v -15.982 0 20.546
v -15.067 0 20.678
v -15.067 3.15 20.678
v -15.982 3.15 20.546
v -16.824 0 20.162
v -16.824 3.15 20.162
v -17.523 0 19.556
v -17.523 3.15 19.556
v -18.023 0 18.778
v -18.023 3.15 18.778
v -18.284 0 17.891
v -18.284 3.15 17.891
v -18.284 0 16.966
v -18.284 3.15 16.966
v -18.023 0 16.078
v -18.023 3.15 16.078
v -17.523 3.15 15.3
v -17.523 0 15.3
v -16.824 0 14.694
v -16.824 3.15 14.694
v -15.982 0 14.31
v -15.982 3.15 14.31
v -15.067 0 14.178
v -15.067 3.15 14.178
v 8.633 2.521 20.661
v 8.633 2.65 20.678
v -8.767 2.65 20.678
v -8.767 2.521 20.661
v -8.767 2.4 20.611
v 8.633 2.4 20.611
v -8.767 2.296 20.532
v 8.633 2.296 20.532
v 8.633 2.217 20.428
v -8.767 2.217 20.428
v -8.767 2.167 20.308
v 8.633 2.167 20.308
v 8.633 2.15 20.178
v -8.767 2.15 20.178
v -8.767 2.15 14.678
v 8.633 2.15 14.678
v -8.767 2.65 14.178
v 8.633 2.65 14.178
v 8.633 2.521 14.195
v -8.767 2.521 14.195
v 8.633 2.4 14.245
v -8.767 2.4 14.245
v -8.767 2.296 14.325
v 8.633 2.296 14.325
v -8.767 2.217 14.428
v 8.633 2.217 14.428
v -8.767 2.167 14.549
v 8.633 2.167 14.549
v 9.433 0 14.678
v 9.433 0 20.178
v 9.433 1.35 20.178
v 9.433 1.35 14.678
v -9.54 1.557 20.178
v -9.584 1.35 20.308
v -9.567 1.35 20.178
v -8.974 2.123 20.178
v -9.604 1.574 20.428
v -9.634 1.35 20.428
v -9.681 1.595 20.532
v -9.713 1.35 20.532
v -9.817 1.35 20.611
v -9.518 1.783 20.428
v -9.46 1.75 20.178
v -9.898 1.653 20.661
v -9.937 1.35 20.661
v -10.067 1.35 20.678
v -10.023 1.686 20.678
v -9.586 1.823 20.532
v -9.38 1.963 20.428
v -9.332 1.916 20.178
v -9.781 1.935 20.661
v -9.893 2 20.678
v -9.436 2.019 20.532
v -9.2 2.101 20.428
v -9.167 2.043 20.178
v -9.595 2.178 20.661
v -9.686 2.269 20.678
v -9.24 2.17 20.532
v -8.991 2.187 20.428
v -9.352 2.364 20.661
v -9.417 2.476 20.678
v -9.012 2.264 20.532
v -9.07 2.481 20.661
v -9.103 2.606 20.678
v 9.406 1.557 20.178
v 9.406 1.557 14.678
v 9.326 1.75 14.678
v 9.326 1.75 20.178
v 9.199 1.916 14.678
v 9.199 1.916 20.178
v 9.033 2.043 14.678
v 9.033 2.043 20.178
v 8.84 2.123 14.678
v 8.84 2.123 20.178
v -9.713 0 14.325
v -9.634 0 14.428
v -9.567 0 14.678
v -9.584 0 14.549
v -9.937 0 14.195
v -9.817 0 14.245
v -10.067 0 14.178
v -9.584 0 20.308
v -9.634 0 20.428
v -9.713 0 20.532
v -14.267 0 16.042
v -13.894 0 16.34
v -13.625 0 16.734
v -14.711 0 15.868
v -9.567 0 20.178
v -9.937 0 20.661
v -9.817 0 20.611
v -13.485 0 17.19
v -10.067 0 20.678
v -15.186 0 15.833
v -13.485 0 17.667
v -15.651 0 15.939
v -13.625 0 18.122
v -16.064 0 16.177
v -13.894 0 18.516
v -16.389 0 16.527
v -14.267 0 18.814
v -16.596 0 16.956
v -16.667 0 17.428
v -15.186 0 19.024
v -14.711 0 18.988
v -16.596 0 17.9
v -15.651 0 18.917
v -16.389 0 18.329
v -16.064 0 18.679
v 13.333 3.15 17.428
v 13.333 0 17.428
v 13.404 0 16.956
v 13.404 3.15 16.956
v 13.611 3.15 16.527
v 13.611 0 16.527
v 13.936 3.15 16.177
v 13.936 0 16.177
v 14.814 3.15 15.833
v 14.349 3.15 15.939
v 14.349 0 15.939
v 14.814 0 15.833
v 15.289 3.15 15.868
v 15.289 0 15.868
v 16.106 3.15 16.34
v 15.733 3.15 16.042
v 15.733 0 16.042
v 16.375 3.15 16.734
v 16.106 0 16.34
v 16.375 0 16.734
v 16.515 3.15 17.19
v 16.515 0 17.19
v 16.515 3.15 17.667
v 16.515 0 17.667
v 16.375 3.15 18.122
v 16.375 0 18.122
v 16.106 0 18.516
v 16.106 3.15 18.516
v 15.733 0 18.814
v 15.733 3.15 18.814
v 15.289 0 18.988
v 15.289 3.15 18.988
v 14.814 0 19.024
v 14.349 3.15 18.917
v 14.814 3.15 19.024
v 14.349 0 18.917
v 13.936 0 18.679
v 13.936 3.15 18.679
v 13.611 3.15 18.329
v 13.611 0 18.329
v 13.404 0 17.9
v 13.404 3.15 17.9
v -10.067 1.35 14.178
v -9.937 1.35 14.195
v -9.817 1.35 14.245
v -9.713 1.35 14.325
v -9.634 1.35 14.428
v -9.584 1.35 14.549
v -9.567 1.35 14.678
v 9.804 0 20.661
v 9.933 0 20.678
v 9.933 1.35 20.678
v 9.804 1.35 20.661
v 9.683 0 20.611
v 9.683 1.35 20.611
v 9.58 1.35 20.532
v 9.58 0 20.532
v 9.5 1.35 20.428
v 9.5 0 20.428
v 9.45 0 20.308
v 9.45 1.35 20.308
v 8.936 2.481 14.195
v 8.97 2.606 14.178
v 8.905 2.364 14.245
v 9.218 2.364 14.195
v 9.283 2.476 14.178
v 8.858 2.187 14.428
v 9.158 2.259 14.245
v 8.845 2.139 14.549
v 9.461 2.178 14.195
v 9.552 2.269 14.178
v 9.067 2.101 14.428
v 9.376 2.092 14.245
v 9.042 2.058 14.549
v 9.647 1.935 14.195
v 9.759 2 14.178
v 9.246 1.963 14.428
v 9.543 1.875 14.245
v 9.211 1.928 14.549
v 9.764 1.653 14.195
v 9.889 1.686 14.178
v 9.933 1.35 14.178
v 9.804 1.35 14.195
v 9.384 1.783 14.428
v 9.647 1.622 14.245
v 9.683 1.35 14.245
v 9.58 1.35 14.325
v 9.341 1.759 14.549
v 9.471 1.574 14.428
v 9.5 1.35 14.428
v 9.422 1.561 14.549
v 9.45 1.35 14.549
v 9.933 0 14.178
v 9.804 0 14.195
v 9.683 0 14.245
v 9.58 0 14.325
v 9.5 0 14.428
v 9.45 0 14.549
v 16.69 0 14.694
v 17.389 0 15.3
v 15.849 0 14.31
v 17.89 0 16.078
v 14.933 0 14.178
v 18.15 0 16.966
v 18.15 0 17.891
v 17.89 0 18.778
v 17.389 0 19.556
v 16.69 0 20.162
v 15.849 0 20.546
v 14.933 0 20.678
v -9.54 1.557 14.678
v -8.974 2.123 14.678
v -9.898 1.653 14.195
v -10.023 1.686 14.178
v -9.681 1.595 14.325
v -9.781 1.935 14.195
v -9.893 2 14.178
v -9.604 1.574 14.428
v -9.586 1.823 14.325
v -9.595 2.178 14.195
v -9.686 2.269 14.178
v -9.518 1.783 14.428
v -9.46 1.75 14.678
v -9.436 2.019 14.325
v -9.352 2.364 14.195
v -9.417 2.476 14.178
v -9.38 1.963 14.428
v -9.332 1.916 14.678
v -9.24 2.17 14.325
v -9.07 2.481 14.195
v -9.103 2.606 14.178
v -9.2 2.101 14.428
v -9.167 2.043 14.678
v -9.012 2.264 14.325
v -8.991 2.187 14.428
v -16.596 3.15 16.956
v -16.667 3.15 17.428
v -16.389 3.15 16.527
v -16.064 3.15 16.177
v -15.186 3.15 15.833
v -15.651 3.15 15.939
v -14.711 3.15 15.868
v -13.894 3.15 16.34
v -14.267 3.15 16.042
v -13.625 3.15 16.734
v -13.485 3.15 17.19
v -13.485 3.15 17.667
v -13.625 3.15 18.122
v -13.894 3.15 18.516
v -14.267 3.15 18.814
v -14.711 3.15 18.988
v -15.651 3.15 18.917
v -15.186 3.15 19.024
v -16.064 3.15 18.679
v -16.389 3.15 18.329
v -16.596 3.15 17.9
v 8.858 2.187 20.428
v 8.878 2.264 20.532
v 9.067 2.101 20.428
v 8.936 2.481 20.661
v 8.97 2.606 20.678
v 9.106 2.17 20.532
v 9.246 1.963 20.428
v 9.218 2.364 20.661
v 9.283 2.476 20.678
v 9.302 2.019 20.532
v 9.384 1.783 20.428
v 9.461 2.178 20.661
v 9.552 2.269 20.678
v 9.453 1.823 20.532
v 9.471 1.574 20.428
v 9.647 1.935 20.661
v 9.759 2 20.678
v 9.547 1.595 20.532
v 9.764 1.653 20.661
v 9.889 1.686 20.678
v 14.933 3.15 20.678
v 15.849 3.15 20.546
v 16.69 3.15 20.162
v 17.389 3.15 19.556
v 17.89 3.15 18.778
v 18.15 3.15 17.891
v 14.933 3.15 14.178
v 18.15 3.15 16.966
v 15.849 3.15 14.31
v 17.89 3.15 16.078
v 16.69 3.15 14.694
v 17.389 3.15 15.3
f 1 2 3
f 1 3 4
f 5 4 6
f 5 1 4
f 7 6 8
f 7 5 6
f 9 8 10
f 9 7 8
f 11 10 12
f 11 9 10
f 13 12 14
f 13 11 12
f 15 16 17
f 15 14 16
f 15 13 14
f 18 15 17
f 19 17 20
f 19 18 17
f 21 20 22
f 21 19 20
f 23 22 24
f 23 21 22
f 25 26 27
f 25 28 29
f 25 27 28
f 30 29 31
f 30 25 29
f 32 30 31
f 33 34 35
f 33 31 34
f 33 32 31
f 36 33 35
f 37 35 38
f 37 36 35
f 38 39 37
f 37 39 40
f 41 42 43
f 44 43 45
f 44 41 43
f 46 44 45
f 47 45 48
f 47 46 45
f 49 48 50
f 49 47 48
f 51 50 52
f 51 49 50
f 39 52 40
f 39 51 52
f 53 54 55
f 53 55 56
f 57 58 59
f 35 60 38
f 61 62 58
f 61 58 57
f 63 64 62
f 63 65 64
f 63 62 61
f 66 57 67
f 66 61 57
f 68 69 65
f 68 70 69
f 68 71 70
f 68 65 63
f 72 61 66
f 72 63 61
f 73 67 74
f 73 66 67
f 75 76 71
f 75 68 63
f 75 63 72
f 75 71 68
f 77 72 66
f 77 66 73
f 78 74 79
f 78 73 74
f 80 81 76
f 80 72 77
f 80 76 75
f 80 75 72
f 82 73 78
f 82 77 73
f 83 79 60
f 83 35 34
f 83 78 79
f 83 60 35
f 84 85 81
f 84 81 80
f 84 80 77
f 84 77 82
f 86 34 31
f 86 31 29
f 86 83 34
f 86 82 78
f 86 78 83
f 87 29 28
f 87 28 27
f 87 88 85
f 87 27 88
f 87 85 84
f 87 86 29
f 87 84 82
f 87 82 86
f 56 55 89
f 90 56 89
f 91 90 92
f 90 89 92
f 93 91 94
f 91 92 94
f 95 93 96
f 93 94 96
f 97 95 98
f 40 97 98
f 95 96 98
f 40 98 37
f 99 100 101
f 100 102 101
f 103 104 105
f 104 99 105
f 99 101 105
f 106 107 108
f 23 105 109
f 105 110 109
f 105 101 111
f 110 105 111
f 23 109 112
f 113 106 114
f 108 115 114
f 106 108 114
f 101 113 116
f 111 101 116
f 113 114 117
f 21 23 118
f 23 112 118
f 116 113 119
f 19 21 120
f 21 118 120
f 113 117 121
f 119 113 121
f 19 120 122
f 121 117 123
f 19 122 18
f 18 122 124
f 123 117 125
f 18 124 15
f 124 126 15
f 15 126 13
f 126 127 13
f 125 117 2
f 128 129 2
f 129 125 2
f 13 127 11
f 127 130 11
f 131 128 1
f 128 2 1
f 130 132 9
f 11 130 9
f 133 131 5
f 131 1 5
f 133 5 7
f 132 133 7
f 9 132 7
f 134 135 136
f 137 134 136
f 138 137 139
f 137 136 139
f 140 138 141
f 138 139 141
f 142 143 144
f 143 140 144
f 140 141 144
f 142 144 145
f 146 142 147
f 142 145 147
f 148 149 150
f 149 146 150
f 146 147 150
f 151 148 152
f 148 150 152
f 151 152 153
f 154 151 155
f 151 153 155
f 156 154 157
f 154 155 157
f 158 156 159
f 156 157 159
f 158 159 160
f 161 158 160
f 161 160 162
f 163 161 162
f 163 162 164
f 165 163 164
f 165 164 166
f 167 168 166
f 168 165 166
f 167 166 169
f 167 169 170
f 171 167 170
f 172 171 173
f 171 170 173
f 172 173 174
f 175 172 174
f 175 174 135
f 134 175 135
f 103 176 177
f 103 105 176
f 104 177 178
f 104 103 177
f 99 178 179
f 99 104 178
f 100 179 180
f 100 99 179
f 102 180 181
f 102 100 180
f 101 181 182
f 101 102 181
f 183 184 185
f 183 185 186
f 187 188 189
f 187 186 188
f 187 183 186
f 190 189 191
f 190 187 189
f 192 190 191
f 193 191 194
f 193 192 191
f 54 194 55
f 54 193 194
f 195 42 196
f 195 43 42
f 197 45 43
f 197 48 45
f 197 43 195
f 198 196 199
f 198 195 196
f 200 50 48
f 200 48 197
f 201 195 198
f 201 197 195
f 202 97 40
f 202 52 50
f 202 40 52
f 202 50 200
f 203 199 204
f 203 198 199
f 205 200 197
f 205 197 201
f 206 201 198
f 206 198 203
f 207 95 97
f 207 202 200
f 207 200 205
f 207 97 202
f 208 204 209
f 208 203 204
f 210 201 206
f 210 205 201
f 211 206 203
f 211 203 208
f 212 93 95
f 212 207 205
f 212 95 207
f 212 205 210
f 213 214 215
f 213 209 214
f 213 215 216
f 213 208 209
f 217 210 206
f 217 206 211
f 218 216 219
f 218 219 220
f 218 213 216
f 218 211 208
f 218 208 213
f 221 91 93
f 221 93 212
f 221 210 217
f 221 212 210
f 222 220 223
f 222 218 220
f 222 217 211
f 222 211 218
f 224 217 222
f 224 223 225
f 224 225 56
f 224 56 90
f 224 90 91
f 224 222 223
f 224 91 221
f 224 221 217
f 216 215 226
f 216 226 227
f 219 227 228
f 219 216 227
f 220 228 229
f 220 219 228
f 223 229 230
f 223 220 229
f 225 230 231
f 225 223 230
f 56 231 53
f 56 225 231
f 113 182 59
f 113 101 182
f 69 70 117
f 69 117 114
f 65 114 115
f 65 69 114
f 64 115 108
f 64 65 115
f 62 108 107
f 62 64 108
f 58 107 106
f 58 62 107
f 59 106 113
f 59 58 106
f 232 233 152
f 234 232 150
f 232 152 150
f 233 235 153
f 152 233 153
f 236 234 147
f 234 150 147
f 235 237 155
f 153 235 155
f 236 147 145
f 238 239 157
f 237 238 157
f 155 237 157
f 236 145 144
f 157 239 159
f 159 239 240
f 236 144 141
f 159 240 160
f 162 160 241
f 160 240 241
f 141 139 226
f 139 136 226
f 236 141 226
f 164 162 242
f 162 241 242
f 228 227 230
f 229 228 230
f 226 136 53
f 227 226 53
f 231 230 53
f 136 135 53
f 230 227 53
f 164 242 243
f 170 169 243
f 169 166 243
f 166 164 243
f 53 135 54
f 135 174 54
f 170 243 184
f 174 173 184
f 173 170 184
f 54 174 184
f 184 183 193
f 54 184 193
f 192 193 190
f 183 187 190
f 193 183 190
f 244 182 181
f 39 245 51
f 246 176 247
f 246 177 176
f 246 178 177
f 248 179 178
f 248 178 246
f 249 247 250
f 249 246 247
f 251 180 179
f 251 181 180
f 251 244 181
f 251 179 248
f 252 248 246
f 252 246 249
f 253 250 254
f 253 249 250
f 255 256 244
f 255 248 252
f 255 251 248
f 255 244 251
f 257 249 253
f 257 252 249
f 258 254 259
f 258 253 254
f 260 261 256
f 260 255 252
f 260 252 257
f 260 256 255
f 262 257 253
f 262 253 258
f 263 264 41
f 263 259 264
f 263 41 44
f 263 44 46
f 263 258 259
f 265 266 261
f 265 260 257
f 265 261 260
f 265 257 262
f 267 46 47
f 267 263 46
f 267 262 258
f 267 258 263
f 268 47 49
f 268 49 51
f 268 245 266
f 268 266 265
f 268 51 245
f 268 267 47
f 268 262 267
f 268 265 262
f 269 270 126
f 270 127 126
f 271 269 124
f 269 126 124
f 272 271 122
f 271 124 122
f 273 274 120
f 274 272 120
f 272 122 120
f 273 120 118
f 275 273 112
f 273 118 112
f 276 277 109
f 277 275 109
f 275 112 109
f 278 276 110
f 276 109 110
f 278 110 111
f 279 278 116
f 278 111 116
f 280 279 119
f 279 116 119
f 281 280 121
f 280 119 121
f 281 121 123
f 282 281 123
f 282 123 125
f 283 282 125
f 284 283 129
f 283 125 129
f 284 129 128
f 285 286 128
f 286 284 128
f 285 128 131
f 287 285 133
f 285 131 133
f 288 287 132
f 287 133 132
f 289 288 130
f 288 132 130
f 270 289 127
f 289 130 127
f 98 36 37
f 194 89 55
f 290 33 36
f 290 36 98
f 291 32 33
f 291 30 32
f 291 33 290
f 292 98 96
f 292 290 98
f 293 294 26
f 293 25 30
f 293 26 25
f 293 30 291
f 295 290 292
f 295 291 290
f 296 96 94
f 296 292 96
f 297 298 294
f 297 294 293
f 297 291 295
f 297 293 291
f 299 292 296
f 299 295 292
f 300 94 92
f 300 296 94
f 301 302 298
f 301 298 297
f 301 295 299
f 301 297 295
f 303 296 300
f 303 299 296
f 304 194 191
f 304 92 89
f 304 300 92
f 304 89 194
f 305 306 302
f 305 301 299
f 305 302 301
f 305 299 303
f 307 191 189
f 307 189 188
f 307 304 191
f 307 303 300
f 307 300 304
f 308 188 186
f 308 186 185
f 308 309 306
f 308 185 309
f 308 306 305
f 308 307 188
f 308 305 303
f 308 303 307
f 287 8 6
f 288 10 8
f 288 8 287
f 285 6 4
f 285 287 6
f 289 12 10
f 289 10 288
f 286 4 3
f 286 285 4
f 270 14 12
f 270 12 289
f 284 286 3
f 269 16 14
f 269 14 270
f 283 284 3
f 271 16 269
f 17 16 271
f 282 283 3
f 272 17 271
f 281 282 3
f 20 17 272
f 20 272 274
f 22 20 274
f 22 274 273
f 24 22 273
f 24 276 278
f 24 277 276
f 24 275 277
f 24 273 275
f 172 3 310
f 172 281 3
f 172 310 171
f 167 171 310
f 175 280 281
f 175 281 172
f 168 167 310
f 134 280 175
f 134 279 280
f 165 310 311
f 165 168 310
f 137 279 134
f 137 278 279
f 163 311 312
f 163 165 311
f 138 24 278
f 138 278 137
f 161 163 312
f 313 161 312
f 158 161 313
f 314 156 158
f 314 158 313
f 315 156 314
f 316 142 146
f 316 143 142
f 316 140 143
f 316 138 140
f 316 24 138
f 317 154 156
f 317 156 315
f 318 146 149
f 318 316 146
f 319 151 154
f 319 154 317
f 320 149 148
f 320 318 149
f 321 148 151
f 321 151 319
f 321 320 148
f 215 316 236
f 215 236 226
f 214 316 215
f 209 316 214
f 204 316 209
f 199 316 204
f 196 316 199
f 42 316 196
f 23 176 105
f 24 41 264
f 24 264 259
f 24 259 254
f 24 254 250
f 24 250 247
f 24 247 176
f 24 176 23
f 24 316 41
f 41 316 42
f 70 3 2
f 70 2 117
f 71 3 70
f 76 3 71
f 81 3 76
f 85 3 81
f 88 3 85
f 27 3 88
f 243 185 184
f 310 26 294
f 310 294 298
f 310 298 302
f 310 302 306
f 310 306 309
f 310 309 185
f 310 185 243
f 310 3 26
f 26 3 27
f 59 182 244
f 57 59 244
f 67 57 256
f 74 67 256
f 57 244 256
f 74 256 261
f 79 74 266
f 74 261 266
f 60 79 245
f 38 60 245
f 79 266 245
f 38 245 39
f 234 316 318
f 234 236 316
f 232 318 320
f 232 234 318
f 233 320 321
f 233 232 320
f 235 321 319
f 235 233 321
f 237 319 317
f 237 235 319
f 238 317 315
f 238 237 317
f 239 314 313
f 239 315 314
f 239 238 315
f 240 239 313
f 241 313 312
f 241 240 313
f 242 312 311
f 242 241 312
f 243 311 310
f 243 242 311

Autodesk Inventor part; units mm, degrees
ref_plane "YZ Plane" through (0, 0, 0) normal (1, 0, 0) x (0, 1, 0)
ref_plane "XZ Plane" through (0, 0, 0) normal (0, 1, 0) x (-1, 0, 0)
ref_plane "XY Plane" through (0, 0, 0) normal (0, 0, 1) x (1, 0, 0)
sketch "Szkic1" plane through (0, 0, 0) normal (0, 1, 0) x (-1, 0, 0)
  line L0 (9.5668, 14.1781) -> (9.5668, 20.6781)
  line L1 (15.0668, 14.1781) -> (9.5668, 14.1781)
  arc A0 (15.0668, 14.1781) -> (15.0668, 20.6781) centre (15.0668, 17.4281) ccw
  line L2 (9.5668, 20.6781) -> (15.0668, 20.6781)
  circle A1 centre (15.0668, 17.4281) radius 1.6
  line L3 (-14.9332, 20.6781) -> (-9.4332, 20.6781)
  arc A2 (-14.9332, 20.6781) -> (-14.9332, 14.1781) centre (-14.9332, 17.4281) ccw
  line L4 (-9.4332, 14.1781) -> (-14.9332, 14.1781)
  line L5 (-9.4332, 20.6781) -> (-9.4332, 14.1781)
  circle A3 centre (-14.9332, 17.4281) radius 1.6
  point P0 (0, 0)
extrude "Wyciągnięcie proste1" add sketch "Szkic1" along normal blind 3.15
sketch "Szkic2" plane through (0, 3.15, 0) normal (0, 1, 0) x (1, 0, 0)
  line L0 (-9.5668, -20.6781) -> (-9.5668, -14.1781) projected
  line L1 (9.4332, -14.1781) -> (9.4332, -20.6781) projected
  line L2 (-15.0668, -20.6781) -> (-9.5668, -20.6781) projected
  line L3 (9.4332, -14.1781) -> (9.4332, -20.6781) projected
  line L4 (-9.5668, -20.6781) -> (9.4332, -20.6781)
  line L5 (-9.5668, -14.1781) -> (-15.0668, -14.1781) projected
  line L6 (9.4332, -14.1781) -> (-9.5668, -14.1781)
  point P0 (0, 0)
extrude "Wyciągnięcie proste2" add sketch "Szkic2" against normal blind 1
fillet "Zaokrąglenie1" radius 0.8 2 edges at (9.4332, 2.15, 17.4281) (-9.5668, 2.15, 17.4281)
fillet "Zaokrąglenie2" radius 0.5 6 edges at (9.4332, 0.675, 14.1781) (-9.5668, 0.675, 14.1781) (-0.0668, 2.15, 14.1781) (-9.5668, 0.675, 20.6781) (9.4332, 0.675, 20.6781) (-0.0668, 2.15, 20.6781)
properties part number "dol_trzymacz"
